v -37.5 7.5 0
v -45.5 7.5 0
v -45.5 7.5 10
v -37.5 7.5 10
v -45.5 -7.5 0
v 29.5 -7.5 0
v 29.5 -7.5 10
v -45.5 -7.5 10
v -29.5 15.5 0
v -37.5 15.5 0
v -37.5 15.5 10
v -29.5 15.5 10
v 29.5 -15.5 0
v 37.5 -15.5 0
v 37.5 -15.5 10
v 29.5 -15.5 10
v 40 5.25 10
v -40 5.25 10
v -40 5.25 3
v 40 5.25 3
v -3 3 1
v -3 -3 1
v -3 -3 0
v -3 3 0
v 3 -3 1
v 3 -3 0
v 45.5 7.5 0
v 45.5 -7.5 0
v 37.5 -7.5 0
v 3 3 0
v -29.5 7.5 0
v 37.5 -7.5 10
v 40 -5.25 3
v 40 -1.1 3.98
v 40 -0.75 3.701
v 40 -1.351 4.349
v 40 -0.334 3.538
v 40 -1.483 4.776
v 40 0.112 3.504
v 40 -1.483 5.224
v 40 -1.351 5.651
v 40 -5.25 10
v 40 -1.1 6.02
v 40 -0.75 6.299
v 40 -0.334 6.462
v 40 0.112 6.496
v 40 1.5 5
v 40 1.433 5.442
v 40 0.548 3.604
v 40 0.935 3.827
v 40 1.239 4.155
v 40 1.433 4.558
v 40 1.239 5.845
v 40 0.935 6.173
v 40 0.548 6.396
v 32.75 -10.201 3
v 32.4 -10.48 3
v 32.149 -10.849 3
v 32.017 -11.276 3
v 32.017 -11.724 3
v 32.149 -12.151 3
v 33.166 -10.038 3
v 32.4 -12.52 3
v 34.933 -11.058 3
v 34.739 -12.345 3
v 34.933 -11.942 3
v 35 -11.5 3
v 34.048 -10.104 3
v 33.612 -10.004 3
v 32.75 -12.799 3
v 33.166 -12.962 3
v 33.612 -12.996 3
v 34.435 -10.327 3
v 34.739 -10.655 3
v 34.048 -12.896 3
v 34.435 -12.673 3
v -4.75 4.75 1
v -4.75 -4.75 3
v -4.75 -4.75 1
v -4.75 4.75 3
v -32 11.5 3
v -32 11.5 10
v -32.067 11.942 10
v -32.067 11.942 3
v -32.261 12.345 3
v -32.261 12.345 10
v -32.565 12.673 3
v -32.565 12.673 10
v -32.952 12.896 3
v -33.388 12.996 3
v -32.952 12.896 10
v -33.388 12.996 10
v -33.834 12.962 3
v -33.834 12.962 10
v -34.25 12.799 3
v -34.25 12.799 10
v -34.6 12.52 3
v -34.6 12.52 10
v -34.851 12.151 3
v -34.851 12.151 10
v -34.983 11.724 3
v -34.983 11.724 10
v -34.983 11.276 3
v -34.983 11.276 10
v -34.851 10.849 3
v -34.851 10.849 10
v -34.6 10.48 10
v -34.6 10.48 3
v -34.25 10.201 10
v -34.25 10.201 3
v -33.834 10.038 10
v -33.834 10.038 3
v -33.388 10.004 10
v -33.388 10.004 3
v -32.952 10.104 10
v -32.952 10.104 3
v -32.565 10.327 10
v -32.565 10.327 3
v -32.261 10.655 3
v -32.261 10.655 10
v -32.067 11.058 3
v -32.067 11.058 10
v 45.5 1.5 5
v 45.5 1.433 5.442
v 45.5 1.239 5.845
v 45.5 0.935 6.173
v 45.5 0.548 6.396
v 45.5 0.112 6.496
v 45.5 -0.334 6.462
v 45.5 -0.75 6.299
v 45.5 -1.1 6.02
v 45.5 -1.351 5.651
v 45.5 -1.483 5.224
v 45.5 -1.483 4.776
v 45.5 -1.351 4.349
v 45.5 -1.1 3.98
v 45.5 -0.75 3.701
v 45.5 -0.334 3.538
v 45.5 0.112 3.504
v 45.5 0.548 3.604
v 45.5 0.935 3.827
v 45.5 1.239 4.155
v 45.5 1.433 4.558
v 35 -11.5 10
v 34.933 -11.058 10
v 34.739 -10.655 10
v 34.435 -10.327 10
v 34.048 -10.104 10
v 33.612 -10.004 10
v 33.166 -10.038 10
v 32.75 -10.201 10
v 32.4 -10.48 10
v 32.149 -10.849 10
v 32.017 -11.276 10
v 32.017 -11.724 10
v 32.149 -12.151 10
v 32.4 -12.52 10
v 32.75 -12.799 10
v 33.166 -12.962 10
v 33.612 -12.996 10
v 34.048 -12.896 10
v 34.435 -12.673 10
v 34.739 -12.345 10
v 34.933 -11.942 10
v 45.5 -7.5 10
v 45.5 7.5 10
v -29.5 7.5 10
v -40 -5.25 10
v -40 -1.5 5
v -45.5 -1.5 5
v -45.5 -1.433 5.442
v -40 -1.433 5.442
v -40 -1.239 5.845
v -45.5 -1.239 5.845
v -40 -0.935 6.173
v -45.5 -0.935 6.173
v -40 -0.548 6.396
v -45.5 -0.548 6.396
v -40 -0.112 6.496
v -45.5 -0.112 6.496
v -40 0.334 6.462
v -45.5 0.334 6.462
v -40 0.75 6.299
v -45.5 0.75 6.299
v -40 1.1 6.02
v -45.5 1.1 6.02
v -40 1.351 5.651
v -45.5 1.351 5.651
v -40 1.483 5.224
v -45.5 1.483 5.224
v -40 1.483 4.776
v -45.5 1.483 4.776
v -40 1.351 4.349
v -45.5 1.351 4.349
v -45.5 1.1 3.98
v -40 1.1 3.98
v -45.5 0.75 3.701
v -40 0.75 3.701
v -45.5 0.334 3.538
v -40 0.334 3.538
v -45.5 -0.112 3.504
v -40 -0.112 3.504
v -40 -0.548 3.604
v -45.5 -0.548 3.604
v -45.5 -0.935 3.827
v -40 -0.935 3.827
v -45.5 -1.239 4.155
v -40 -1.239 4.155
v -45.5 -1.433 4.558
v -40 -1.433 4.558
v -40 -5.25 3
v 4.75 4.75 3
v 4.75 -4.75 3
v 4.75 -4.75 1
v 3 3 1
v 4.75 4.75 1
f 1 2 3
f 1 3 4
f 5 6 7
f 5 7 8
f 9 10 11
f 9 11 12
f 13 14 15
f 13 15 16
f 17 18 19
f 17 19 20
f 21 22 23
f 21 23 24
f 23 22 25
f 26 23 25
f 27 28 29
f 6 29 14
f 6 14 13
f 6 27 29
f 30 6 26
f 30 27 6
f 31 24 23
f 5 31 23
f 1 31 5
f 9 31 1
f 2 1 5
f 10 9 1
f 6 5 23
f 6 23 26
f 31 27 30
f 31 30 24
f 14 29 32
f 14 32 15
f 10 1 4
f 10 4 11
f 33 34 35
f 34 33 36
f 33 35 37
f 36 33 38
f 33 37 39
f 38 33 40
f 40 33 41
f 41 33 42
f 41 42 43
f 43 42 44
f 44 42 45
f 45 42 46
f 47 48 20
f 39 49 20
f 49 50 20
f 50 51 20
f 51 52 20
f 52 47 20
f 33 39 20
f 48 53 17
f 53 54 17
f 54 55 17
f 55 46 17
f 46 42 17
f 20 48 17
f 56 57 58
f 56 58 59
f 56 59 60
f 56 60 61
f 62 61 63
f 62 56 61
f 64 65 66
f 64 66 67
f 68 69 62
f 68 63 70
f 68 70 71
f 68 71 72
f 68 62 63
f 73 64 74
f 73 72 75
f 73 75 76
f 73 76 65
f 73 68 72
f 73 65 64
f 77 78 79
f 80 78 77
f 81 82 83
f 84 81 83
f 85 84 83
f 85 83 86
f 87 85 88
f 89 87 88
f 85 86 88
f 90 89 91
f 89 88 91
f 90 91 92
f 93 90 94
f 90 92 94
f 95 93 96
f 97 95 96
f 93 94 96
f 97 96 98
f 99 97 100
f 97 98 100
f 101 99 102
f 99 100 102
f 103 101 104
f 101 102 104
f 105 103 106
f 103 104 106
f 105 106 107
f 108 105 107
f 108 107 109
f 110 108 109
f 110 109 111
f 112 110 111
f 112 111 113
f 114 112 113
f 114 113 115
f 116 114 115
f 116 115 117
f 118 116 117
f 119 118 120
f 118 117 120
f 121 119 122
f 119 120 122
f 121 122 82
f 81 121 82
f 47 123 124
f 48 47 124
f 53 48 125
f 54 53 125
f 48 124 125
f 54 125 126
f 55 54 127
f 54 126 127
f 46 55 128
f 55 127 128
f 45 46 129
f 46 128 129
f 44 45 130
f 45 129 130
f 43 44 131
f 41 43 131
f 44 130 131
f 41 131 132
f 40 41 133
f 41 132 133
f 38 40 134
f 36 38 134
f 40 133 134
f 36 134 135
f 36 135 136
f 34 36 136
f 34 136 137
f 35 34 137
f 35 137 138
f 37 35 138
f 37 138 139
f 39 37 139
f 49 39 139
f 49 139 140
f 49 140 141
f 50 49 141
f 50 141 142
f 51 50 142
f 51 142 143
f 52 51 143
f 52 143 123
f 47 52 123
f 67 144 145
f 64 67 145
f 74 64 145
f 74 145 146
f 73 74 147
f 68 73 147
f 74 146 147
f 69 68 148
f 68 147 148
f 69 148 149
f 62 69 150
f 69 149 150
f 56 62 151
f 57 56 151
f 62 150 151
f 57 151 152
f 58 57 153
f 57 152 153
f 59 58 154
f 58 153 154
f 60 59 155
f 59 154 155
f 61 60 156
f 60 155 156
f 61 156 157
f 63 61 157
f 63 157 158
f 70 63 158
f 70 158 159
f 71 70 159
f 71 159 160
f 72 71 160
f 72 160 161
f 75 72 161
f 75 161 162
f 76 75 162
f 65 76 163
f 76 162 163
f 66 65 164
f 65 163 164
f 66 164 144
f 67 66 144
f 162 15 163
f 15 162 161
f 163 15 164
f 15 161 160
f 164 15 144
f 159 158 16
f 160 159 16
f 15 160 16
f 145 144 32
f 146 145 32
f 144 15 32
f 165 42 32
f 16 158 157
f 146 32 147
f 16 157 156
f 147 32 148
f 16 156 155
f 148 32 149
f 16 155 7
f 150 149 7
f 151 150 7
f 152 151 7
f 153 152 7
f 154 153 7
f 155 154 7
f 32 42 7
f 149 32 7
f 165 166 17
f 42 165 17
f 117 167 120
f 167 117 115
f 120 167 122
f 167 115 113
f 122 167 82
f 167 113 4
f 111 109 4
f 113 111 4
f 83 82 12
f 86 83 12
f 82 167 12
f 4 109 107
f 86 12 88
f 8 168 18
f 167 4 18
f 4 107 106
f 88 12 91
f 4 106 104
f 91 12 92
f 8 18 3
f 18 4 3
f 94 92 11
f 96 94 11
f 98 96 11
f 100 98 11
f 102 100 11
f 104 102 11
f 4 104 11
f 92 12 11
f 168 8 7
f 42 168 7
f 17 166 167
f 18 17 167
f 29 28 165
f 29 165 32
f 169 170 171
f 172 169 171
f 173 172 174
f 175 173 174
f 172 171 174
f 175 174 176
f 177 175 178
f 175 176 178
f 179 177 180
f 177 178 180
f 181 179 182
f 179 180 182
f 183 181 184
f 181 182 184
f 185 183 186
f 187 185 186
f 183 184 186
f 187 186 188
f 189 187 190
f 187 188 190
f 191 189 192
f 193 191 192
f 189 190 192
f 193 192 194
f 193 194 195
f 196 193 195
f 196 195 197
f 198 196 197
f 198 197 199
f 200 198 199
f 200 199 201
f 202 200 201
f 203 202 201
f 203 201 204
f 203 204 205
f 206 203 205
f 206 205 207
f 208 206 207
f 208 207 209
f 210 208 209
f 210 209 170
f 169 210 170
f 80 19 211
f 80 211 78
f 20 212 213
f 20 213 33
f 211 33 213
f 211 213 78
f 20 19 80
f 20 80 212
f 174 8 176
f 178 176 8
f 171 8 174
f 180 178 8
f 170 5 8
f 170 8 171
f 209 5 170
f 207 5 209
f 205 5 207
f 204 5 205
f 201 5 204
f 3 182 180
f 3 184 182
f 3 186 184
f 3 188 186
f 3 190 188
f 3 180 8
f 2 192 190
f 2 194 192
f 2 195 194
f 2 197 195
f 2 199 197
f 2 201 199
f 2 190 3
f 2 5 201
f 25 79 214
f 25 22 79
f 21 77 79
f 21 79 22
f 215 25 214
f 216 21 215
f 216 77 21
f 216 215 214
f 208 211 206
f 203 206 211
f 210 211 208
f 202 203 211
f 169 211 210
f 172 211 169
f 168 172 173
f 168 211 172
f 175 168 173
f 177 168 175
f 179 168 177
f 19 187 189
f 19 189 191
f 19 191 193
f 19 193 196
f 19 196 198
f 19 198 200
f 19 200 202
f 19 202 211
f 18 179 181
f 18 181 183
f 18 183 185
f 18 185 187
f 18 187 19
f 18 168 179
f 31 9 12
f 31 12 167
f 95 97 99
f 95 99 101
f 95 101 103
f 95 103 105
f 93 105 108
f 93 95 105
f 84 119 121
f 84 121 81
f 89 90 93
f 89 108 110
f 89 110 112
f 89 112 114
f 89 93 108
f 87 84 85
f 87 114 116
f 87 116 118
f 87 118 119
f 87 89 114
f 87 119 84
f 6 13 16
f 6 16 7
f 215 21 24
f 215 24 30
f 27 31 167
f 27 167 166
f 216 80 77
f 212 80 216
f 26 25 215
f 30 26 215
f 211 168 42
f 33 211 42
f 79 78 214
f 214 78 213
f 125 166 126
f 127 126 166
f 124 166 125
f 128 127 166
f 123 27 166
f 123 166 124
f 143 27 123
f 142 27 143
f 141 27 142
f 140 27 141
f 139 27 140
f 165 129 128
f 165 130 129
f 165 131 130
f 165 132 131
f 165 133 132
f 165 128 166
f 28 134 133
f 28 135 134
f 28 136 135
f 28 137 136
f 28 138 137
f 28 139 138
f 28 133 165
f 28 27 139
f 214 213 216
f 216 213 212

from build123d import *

# Parameters (mm, degrees)
PAD007_DEPTH    = 10
SKETCH016_R     = 1.5
SKETCH016_W     = 80
SKETCH016_H     = 10.5
POCKET008_DEPTH = 7
SKETCH017_W     = 9.5
SKETCH017_H     = 9.5
POCKET009_DEPTH = 2
SKETCH018_W     = 6
SKETCH018_H     = 6
POCKET010_DEPTH = 5
SKETCH019_R     = 1.5
POCKET011_DEPTH = 6
SKETCH020_R     = 1.5
POCKET012_DEPTH = 6


with BuildPart() as part:
    # Sketch015 → Pad007 (new body)
    with BuildSketch(Plane.XY):
        Polygon((45.5, 7.5), (45.5, -7.5), (37.5, -7.5), (37.5, -15.5), (29.5, -15.5), (29.5, -7.5), (-45.5, -7.5), (-45.5, 7.5), (-37.5, 7.5), (-37.5, 15.5), (-29.5, 15.5), (-29.5, 7.5), align=None)
    extrude(amount=PAD007_DEPTH)

    # Sketch016 (on Face14 of Pad007) → Pocket008 (cut)
    with BuildSketch(Plane.XY.offset(10)):
        with Locations((-33.5, 11.5)):
            Circle(SKETCH016_R)
        with Locations((33.5, -11.5)):
            Circle(SKETCH016_R)
        Rectangle(SKETCH016_W, SKETCH016_H)
    extrude(amount=-POCKET008_DEPTH, mode=Mode.SUBTRACT)

    # Sketch017 (on Face23 of Pocket008) → Pocket009 (cut)
    with BuildSketch(Plane.XY.offset(3)):
        Rectangle(SKETCH017_W, SKETCH017_H)
    extrude(amount=-POCKET009_DEPTH, mode=Mode.SUBTRACT)

    # Sketch018 (on Face28 of Pocket009) → Pocket010 (cut)
    with BuildSketch(Plane.XY.offset(1)):
        Rectangle(SKETCH018_W, SKETCH018_H)
    extrude(amount=-POCKET010_DEPTH, mode=Mode.SUBTRACT)

    # Sketch019 (on Face1 of Pocket010) → Pocket011 (cut)
    with BuildSketch(Plane.YZ.offset(45.5)):
        with Locations((0, 5)):
            Circle(SKETCH019_R)
    extrude(amount=-POCKET011_DEPTH, mode=Mode.SUBTRACT)

    # Sketch020 (on Face15 of Pocket011) → Pocket012 (cut)
    with BuildSketch(Plane(origin=(-45.5, 0, 0), x_dir=(0, -1, 0), z_dir=(-1, 0, 0))):
        with Locations((0, 5)):
            Circle(SKETCH020_R)
    extrude(amount=-POCKET012_DEPTH, mode=Mode.SUBTRACT)


solid = part.part
